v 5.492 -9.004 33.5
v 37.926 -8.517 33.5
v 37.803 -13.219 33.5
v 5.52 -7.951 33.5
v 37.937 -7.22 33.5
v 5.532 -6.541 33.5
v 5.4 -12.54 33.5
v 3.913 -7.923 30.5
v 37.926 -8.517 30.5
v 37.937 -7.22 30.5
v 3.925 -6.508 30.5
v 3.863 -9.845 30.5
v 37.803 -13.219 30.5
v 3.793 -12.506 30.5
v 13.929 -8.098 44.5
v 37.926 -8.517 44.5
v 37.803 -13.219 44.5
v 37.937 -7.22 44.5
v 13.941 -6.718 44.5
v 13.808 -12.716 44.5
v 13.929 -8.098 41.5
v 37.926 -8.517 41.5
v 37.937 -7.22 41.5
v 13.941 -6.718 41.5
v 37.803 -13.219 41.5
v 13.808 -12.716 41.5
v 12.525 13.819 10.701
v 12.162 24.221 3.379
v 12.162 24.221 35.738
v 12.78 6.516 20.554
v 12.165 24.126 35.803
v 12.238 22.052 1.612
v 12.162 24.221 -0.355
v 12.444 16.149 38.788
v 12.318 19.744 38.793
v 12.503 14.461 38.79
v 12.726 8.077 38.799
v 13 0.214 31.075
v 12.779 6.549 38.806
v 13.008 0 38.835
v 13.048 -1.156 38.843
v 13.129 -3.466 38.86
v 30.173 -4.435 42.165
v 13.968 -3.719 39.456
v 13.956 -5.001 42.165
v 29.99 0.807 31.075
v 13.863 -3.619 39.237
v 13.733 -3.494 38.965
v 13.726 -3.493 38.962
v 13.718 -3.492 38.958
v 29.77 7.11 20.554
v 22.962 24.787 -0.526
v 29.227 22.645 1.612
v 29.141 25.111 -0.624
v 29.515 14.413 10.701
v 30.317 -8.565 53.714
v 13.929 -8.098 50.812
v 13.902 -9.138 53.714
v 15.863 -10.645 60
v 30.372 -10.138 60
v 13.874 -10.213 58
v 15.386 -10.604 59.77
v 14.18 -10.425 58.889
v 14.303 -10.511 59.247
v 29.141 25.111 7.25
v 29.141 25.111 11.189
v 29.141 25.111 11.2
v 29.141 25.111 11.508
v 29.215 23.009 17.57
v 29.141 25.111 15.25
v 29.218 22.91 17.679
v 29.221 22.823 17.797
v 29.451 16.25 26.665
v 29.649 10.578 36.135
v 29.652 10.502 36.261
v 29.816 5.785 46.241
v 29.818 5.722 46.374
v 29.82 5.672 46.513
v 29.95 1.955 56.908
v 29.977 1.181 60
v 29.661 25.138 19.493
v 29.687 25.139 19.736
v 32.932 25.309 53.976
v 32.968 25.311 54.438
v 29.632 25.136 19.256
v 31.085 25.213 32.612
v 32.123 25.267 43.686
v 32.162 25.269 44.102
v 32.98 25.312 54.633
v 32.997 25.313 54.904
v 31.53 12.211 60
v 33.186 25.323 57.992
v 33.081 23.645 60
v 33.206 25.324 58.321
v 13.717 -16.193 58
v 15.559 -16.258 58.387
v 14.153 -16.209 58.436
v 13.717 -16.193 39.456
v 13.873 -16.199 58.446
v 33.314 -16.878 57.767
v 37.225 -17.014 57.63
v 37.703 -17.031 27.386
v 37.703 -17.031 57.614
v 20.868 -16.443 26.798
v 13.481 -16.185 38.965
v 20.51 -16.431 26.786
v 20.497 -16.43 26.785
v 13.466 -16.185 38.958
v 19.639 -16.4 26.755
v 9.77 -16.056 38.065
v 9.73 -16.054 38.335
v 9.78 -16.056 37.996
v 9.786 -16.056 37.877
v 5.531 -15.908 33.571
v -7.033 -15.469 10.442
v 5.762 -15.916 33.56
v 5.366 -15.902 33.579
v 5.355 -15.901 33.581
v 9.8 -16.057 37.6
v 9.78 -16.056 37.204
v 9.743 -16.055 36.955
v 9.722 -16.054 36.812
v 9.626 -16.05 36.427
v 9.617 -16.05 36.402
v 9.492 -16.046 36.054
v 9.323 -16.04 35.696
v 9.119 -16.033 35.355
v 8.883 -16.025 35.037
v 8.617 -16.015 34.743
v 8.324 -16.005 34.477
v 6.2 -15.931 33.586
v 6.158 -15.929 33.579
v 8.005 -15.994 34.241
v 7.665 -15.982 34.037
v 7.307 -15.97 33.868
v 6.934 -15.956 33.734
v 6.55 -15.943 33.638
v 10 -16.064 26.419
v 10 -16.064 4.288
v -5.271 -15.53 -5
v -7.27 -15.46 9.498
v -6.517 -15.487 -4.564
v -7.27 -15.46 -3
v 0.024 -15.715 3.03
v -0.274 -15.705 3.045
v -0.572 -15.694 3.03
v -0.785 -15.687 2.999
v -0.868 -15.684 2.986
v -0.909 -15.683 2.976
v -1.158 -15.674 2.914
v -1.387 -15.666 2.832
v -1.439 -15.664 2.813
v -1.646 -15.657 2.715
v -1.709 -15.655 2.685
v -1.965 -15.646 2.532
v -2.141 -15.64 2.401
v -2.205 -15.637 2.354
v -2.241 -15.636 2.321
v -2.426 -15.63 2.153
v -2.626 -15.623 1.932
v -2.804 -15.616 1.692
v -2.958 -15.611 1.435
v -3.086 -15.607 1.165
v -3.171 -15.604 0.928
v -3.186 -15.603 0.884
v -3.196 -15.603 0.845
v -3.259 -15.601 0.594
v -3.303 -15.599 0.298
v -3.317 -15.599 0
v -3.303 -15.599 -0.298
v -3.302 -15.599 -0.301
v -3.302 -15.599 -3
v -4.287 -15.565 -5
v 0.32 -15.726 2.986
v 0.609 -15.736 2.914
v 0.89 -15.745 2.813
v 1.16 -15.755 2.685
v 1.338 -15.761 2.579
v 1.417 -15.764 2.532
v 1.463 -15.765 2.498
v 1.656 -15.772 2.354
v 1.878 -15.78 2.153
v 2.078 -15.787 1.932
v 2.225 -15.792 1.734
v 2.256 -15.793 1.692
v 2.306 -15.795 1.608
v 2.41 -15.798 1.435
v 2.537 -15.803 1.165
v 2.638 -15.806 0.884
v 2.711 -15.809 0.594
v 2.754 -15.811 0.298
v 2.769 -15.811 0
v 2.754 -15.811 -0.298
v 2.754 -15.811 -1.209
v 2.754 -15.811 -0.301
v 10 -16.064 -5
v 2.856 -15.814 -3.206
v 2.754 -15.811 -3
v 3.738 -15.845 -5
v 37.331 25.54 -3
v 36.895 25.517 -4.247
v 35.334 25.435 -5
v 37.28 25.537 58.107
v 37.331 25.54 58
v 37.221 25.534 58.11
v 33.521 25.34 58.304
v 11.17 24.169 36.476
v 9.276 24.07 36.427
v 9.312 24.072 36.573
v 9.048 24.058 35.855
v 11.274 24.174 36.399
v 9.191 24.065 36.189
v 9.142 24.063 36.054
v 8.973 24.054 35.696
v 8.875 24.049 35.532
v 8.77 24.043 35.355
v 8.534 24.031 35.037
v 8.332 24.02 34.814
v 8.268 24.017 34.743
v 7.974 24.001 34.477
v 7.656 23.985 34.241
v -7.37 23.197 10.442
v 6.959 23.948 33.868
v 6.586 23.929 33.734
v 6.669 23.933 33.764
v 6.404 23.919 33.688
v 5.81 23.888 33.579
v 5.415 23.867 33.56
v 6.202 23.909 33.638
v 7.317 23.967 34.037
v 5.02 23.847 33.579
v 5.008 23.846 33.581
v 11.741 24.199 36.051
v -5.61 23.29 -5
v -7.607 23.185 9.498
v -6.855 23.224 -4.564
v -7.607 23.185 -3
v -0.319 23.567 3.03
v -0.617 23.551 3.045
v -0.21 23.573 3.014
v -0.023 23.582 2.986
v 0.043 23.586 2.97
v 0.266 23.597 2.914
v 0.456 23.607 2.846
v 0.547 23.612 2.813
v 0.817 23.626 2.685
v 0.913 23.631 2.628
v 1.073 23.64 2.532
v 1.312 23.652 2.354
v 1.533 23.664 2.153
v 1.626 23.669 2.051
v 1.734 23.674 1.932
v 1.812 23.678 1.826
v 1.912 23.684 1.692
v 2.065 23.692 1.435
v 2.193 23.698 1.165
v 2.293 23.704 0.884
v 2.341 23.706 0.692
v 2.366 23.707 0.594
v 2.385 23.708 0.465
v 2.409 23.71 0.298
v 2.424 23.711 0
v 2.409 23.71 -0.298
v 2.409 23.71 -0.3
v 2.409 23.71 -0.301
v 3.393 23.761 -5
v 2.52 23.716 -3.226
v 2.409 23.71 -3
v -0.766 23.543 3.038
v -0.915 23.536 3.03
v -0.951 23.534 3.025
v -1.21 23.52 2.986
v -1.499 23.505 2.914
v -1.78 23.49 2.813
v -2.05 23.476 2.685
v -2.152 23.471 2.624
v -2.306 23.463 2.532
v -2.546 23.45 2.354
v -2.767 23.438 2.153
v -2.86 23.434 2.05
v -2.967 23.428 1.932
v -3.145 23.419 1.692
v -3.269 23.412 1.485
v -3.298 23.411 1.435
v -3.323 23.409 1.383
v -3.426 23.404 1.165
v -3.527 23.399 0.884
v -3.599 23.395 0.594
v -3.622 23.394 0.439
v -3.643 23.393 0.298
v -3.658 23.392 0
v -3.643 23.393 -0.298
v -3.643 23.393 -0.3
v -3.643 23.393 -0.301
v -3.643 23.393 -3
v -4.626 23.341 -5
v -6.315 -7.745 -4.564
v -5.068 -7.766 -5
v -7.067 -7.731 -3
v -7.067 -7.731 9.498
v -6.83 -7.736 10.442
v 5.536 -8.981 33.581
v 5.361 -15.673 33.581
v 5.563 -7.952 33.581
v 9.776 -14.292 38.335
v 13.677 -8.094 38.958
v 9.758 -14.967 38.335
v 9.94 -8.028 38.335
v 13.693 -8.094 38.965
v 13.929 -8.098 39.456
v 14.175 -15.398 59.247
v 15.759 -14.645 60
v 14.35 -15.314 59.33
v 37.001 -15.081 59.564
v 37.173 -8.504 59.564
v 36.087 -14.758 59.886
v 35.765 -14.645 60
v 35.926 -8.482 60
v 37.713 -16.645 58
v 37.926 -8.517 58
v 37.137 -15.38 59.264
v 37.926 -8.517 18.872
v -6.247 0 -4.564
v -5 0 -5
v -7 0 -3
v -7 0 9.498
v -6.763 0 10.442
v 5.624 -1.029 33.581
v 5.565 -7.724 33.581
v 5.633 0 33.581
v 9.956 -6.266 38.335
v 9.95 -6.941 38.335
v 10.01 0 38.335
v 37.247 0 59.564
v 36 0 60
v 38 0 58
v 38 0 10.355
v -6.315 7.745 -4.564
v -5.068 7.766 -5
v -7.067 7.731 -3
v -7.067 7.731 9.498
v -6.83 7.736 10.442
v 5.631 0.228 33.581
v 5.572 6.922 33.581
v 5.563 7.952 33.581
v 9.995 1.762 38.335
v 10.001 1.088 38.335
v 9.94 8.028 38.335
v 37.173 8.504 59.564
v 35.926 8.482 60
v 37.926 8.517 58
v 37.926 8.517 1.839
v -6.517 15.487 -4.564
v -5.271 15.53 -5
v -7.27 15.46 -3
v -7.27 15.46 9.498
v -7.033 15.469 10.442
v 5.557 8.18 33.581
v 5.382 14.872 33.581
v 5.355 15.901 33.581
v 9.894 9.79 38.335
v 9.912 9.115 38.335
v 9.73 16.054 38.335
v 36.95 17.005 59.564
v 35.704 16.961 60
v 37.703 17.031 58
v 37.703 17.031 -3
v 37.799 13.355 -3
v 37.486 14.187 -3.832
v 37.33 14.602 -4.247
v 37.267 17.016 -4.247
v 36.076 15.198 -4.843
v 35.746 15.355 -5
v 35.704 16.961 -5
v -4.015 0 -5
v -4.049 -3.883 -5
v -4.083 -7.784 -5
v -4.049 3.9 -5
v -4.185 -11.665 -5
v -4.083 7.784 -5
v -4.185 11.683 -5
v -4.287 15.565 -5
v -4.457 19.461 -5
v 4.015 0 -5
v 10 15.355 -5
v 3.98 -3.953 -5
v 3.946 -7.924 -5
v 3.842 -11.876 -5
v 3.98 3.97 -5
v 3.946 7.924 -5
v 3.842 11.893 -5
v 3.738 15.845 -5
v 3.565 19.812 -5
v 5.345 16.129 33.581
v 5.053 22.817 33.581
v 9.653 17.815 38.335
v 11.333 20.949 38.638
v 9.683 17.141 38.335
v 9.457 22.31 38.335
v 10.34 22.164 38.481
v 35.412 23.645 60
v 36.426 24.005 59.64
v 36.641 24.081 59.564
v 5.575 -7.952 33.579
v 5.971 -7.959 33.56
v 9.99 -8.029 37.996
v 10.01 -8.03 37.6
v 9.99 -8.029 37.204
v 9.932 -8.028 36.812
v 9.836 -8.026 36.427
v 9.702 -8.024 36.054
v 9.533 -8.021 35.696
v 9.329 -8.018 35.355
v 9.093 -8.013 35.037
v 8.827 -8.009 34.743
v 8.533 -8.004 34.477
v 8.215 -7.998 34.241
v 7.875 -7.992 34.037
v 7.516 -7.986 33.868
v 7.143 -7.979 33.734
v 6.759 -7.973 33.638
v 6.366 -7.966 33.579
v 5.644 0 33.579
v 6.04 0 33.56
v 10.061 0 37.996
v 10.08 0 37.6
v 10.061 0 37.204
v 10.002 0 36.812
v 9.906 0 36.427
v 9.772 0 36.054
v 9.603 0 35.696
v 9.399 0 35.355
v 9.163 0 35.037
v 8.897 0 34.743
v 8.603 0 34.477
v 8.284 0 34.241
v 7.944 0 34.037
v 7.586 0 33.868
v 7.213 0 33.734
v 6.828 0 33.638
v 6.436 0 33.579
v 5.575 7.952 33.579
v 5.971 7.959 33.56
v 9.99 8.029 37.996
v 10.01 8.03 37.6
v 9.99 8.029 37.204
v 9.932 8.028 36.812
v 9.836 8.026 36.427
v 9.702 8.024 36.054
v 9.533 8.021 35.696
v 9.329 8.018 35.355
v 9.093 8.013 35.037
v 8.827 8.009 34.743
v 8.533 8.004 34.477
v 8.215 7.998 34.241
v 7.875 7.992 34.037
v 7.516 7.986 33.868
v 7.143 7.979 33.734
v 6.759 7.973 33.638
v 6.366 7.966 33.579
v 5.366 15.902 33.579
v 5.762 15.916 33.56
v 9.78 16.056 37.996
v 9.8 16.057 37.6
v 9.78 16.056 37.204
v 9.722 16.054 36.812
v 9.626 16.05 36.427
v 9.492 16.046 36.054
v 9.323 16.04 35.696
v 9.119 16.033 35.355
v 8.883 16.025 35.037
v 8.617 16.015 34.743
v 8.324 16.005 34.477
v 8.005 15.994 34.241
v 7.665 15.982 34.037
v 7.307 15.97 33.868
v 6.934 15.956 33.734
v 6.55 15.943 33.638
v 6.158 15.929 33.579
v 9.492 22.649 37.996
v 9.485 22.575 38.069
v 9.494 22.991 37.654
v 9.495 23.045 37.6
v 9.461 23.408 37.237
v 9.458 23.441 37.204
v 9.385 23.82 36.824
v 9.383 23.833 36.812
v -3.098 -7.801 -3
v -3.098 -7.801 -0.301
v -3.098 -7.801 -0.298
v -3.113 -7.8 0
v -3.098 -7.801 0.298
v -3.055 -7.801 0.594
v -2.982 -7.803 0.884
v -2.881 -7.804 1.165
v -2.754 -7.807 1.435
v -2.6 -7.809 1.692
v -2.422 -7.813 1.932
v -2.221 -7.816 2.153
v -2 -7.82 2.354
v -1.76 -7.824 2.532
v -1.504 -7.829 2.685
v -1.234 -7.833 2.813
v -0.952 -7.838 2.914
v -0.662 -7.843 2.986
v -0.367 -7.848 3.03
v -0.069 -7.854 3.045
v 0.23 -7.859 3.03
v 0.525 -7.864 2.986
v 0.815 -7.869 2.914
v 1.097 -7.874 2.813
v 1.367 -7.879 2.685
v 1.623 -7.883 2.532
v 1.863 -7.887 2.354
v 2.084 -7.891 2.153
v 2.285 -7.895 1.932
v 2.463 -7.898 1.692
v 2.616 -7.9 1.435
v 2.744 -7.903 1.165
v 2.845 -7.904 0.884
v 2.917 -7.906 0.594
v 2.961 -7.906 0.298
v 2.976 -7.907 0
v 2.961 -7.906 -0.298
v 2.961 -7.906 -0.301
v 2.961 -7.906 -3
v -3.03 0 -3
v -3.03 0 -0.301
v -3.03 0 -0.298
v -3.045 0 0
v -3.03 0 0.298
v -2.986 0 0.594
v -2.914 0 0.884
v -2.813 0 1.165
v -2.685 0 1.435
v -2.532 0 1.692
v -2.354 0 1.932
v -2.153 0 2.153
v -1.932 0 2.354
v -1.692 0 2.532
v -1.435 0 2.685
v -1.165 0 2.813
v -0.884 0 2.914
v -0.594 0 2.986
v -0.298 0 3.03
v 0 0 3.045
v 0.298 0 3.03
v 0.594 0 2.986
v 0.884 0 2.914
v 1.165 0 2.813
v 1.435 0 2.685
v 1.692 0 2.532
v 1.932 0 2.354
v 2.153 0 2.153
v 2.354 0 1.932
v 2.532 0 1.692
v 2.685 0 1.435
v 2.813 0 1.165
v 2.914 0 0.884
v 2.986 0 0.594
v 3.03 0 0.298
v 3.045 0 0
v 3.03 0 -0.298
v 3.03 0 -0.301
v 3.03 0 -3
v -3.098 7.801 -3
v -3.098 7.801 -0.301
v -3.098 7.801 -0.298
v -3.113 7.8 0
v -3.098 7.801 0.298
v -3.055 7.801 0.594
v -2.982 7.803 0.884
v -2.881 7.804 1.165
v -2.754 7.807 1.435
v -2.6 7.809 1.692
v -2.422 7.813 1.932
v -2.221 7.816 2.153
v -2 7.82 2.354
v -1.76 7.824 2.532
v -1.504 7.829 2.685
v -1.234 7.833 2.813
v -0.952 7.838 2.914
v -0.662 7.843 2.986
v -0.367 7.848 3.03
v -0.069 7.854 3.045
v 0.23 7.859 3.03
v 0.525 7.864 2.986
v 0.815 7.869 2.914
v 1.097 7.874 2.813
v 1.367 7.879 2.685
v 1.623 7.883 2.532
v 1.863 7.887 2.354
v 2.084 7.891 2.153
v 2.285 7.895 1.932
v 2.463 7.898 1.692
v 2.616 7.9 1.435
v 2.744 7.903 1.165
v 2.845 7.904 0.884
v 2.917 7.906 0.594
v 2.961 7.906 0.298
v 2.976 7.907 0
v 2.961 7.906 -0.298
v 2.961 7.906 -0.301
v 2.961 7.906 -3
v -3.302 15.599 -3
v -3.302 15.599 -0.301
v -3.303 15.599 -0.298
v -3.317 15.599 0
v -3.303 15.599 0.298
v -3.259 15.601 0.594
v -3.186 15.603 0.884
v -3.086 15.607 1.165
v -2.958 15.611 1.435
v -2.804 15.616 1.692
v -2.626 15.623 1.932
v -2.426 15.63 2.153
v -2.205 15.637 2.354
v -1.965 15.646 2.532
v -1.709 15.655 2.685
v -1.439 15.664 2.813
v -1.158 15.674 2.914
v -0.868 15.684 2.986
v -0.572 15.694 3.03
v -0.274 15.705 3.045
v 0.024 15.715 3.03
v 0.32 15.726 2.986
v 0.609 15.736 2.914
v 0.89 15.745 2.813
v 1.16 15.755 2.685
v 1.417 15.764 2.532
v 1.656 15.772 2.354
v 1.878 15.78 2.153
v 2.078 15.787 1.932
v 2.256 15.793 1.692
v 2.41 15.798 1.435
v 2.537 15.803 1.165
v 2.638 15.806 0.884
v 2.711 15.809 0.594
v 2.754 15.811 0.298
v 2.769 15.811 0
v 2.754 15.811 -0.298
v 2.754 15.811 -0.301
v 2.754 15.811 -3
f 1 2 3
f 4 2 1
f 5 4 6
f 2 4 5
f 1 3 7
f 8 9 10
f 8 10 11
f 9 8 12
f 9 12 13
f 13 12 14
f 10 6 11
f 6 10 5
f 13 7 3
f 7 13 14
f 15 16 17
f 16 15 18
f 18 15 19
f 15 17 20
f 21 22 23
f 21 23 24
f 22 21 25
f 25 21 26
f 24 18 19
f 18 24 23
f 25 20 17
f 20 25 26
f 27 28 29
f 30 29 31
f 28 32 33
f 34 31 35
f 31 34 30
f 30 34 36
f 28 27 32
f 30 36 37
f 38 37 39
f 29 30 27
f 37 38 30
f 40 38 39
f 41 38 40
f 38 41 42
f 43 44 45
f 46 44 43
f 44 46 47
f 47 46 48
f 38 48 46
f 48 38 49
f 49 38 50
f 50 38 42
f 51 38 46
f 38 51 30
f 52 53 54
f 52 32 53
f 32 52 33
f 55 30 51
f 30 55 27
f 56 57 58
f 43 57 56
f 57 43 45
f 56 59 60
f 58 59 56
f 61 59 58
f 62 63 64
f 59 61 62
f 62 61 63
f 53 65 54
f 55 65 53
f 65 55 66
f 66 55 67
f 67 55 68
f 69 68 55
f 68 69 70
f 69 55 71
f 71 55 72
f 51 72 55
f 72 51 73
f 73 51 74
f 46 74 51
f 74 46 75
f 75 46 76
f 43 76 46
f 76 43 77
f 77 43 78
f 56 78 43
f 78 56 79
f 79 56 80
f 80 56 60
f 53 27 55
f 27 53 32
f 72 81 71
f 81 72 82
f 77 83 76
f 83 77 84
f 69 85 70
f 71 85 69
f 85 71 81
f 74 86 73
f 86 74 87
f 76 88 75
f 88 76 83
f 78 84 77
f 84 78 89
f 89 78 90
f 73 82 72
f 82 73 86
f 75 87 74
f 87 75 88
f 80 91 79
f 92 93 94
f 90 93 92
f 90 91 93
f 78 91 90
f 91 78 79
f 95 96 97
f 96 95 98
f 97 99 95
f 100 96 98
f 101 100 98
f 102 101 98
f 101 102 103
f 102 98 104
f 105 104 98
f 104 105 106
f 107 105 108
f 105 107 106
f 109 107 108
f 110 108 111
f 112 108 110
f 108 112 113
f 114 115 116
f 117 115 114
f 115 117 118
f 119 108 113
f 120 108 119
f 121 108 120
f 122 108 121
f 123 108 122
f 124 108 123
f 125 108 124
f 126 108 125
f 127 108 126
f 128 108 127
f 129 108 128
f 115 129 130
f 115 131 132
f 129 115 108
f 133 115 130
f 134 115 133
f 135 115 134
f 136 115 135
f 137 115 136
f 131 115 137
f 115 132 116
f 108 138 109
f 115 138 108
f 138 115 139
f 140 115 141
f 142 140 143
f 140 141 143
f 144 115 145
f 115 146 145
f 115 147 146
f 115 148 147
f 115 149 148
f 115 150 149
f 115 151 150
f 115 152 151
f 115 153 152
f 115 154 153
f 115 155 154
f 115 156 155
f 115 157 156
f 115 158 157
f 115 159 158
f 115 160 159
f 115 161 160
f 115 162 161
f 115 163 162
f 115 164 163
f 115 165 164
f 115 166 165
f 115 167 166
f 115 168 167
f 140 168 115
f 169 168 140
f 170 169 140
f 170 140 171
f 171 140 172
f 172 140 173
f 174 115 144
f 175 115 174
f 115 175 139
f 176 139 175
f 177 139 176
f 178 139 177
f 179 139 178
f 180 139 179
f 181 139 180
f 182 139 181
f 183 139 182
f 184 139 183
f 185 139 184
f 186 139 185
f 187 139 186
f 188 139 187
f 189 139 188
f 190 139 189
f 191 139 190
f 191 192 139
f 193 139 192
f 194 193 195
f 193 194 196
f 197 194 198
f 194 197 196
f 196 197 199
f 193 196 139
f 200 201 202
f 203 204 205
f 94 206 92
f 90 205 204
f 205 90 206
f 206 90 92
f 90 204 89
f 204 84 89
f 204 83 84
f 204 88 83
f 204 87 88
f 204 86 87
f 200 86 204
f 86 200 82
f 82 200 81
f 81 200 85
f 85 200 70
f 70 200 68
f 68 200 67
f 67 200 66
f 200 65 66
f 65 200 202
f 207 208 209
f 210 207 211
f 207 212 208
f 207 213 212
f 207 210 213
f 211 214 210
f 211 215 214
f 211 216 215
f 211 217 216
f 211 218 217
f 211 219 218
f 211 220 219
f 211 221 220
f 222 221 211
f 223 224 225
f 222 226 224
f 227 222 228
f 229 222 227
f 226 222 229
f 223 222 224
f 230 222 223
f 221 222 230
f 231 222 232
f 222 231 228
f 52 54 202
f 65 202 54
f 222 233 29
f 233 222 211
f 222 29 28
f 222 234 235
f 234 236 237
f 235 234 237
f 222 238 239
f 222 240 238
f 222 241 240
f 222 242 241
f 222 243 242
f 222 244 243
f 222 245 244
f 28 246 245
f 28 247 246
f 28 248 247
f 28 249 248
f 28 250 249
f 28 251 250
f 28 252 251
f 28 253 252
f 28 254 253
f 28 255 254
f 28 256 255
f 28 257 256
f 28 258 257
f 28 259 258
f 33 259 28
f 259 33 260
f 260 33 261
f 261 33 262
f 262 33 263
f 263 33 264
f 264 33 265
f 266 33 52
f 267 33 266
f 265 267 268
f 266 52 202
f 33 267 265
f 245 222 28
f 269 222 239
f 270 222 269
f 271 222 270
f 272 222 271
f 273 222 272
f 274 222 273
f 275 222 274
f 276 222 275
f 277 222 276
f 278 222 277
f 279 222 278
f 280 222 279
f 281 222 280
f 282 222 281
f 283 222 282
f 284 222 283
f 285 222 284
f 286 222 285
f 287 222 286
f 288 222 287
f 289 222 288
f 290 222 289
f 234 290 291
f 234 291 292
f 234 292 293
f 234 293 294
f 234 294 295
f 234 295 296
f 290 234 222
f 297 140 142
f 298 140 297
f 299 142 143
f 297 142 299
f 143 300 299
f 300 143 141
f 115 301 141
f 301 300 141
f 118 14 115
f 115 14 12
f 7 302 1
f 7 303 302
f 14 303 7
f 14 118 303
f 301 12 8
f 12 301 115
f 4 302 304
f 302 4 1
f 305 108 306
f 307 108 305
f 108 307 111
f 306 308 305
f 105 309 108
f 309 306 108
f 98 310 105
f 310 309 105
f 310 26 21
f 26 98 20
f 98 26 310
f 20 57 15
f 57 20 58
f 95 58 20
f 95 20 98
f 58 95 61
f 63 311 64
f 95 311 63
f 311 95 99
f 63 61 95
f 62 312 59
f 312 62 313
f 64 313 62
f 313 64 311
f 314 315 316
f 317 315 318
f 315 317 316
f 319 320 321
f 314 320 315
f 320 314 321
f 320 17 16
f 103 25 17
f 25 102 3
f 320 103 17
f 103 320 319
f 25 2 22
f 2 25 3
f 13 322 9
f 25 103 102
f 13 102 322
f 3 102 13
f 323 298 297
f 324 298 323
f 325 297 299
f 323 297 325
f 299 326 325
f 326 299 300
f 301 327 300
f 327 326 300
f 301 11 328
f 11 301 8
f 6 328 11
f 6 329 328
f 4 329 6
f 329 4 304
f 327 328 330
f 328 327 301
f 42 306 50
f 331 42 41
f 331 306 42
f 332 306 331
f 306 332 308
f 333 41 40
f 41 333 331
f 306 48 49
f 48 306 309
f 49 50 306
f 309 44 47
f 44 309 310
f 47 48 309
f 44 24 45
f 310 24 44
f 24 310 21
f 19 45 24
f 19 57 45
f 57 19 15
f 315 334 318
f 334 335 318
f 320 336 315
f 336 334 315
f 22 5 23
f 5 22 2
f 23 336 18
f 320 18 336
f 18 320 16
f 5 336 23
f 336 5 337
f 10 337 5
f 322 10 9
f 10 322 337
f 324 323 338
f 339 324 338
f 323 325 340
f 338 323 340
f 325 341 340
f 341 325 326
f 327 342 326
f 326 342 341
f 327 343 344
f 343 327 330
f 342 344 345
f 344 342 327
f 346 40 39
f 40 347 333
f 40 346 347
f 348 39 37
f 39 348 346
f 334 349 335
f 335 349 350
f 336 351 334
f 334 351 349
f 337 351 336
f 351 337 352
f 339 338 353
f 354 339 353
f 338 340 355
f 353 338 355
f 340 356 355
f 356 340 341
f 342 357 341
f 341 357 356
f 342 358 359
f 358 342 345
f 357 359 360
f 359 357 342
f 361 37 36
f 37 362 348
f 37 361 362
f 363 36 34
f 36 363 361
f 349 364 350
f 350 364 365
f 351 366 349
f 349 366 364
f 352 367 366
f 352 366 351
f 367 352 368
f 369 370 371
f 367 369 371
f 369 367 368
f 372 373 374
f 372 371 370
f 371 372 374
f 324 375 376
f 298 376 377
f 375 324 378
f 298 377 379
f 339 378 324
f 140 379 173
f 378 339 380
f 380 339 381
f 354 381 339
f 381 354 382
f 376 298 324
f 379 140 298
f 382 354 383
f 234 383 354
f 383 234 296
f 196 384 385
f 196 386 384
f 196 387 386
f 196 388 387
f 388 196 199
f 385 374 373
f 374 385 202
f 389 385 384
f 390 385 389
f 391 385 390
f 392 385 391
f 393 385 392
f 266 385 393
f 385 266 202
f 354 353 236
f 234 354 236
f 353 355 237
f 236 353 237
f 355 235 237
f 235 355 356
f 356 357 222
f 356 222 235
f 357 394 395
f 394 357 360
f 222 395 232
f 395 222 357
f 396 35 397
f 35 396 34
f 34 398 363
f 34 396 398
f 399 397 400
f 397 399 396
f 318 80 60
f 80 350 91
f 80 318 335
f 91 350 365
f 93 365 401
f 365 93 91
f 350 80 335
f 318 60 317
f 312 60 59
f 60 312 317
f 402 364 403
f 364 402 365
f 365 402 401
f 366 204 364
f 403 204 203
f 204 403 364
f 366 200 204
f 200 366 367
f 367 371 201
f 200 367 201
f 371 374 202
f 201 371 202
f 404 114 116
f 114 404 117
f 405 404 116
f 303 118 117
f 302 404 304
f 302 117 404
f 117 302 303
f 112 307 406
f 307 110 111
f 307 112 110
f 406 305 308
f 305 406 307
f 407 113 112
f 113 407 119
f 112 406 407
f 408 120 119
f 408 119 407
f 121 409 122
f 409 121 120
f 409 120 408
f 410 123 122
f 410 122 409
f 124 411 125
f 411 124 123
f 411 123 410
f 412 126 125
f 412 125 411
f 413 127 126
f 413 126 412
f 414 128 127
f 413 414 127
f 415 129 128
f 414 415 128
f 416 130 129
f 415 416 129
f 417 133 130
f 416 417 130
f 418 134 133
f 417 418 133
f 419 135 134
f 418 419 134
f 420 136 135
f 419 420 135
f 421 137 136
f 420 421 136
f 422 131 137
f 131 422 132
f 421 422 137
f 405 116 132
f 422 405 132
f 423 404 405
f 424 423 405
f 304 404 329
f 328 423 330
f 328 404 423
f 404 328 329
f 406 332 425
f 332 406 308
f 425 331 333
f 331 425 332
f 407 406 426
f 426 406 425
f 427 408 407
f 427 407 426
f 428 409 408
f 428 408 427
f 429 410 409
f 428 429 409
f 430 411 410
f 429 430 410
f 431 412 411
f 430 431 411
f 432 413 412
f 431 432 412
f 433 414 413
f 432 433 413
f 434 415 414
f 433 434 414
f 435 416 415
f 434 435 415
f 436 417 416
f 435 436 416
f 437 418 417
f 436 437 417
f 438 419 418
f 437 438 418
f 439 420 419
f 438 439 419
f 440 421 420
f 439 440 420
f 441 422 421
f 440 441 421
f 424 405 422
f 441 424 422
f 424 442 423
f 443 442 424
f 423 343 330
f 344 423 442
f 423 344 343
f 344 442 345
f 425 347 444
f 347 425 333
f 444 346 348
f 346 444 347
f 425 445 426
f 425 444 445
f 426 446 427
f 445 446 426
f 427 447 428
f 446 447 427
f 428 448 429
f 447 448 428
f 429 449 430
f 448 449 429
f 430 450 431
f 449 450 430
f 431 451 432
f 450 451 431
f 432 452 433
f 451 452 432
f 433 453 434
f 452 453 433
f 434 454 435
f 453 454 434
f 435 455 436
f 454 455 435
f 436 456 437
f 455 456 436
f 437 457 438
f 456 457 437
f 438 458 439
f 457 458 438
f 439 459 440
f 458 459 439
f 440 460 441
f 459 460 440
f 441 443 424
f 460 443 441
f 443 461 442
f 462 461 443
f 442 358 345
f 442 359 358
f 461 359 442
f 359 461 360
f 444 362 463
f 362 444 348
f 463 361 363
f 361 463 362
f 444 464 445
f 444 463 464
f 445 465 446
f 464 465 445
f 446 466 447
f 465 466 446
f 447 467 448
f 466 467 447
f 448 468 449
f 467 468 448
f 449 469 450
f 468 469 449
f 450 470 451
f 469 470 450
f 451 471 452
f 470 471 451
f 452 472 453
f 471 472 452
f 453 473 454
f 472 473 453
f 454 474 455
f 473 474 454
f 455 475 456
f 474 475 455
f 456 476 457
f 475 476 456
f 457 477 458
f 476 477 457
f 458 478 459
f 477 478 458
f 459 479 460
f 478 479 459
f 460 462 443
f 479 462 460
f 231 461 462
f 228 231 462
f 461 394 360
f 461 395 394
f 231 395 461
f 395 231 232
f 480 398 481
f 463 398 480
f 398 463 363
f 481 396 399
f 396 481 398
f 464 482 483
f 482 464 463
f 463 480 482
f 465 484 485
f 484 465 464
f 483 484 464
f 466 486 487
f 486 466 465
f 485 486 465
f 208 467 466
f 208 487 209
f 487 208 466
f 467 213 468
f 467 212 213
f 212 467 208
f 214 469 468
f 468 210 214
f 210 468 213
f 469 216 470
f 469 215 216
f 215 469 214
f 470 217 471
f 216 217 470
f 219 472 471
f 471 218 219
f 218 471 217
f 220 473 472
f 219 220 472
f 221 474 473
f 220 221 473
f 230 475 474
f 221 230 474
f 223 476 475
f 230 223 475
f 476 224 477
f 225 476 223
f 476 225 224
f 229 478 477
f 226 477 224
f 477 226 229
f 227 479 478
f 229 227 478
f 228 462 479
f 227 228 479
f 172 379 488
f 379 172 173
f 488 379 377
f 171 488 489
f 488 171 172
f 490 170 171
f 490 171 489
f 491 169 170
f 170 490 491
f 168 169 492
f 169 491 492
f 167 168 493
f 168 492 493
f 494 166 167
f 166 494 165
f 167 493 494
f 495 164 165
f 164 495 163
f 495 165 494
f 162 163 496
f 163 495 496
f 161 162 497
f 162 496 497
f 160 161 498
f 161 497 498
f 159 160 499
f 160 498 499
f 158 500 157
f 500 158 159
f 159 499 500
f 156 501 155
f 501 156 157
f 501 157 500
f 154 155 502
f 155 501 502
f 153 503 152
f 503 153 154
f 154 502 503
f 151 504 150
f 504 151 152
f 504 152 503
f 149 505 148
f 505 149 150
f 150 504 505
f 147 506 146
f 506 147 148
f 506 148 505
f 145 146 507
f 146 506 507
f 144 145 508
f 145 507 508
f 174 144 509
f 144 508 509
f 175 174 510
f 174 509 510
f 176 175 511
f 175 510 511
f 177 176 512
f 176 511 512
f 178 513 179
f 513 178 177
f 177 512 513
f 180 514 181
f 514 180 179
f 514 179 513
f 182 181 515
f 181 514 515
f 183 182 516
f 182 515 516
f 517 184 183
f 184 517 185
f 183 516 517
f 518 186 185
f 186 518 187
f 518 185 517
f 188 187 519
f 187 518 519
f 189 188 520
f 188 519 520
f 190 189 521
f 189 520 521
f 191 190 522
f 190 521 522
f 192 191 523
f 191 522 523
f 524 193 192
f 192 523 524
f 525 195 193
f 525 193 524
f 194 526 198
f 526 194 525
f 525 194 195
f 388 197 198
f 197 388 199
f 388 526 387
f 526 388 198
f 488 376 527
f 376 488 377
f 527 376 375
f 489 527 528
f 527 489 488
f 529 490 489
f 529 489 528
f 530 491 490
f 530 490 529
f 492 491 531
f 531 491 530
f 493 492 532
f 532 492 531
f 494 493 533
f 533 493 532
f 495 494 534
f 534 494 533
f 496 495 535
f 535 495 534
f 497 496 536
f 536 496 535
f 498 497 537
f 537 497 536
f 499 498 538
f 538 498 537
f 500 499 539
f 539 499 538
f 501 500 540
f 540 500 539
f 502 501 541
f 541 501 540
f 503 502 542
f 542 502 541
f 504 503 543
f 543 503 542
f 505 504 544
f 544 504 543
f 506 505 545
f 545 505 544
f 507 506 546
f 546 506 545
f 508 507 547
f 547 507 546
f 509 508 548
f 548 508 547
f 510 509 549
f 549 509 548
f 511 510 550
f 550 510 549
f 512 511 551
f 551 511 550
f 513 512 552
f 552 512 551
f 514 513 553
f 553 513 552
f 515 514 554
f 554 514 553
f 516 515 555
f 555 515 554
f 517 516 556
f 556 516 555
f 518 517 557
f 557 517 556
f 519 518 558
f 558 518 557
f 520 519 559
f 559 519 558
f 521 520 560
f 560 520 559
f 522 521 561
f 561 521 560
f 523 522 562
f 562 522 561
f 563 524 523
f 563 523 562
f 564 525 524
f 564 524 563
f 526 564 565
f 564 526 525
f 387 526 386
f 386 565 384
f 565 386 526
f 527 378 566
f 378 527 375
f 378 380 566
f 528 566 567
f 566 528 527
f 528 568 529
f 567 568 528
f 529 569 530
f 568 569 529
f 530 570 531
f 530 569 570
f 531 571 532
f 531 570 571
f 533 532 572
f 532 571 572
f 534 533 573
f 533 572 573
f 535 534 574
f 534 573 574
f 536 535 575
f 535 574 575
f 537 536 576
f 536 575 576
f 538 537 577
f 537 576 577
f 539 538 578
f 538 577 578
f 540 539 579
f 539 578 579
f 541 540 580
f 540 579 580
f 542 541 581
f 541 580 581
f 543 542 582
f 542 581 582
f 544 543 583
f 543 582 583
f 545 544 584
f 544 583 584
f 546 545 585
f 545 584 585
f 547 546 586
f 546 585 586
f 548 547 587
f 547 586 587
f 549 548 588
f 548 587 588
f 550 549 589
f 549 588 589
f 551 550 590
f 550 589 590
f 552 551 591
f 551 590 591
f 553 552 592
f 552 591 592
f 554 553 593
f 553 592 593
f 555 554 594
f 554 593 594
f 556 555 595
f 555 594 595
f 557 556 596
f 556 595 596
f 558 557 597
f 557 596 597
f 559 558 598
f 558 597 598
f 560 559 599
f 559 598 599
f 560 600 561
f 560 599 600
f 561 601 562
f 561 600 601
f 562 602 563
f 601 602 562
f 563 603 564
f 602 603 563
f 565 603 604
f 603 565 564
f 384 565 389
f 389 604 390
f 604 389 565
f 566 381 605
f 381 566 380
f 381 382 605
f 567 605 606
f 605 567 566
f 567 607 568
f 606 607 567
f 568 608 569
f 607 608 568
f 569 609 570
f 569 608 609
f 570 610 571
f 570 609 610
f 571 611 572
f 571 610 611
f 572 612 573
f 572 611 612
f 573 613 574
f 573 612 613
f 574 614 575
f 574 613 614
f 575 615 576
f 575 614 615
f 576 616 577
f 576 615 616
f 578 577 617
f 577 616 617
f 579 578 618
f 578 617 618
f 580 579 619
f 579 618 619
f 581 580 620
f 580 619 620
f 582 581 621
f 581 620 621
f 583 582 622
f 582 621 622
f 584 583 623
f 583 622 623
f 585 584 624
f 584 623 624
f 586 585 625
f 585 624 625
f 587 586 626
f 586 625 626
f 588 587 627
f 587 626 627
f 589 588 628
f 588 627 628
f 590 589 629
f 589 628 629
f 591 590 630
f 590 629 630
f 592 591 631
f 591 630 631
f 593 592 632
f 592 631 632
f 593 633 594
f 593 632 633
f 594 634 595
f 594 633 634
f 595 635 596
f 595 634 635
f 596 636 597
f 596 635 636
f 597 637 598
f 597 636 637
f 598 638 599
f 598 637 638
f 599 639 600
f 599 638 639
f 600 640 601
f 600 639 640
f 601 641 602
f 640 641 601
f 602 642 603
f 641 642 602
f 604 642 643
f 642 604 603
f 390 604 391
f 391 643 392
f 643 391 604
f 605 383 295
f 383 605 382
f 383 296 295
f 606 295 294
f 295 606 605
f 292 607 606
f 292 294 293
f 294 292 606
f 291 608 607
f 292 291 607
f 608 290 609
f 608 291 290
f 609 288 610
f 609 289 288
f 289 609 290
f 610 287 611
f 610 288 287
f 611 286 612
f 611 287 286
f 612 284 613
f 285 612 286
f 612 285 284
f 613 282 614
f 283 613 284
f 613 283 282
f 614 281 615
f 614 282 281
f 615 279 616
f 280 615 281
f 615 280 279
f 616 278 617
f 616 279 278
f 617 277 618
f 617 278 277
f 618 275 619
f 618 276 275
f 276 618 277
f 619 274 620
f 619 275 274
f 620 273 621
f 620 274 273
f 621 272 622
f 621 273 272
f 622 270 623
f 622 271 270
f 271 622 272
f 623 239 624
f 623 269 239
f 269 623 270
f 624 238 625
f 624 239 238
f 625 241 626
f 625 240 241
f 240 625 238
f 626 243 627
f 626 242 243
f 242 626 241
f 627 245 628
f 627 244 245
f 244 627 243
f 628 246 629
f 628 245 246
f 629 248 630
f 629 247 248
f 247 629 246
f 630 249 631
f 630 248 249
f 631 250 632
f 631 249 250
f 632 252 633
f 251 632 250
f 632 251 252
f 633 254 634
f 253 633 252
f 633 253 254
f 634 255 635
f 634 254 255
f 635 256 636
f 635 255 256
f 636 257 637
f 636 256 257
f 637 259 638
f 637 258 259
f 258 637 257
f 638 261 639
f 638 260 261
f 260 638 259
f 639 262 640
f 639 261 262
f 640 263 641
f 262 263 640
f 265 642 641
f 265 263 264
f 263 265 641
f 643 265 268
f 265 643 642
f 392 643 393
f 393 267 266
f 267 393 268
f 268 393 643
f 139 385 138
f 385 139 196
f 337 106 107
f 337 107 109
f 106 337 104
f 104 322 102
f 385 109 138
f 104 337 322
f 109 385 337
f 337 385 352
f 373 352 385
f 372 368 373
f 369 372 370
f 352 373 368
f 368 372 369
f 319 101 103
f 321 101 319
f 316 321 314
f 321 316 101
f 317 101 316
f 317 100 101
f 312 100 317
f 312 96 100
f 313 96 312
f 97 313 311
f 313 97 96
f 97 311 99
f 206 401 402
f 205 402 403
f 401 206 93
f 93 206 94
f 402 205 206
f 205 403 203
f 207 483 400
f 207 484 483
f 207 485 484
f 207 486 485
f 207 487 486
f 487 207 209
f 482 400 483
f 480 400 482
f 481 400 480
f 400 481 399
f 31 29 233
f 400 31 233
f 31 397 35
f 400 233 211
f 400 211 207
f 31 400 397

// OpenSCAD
module wire_tray()
{
    radius=450;
    translate([-radius,0,0])
    rotate([0,0,-10])
    rotate_extrude(angle=20, $fa=1)
    {
        translate([radius, 0])
        {
            $fn=64;
            //lower wire
            circle(d=6.09);
            polygon([
                    [-5,-7],
                    [5,-7], 
                    [3.03,-3],
                    [3.03,0],
                    [-3.03,0],
                    [-3.03,-3]               
                ]);
            //upper wire
            translate([6.04,37.6])
                circle(d=8.08);
        }
    }
}

module mounting(angle)
{    
    radius=450;
    translate([-radius,0,0])
    rotate([0,0,angle])
    translate([radius,0,0])
    {
        translate([0,0,32])
            cube([99,6,3], center=true);
        translate([0,0,43])
            cube([99,6,3], center=true);
    }
}

module outline()
{
    polygon([
                    [-7,-5],
                    [38,-5],
                    [38,30],
                    [38,60],
                    [14,60],
                    [14,39],
                    [8,38],
                    [-7,10]
                ]);
}

module blob() {
    radius=450;
    translate([-radius,0,0])
    union(){
        rotate([0,0,-2])
        rotate_extrude(angle=5, $fa=1)
        {
            translate([radius, 0])
            {
                offset(r=2)
                {
                    offset(r=-2)
                    outline();
                }
            }
        }
    }        
}

module lid()
{
    $fn=64;
    lid_diameter=250;
    cylinder(h=17,d=lid_diameter);
    translate([0,0,15])
        cylinder(h=20, d1=lid_diameter, d2=30);
    translate([0,0,33])
        cylinder(h=20, d1=30, d2=50);
}

difference(){
    blob();
    wire_tray();
  //  mounting(2);
  //  mounting(0);
    mounting(-1.2);
    
        rotate([0,0,2])
    translate([13,110,90])
        rotate([0,90,0])
            lid();
    translate([35,-20,-5])
        rotate([45,0,0])
            cube([50,50,50],center=true);
    
    translate([35,-20,90])
        rotate([45,0,0])
            cube([50,50,50],center=true);
    translate([35,29,90])
        rotate([45,0,0])
            cube([50,50,50],center=true);
    translate([0,46,50])
        rotate([45,0,0])
            cube([50,50,50],center=true);
    translate([5,40,65])
        rotate([45,0,-45])
            cube([50,50,50],center=true);
    
    
}
